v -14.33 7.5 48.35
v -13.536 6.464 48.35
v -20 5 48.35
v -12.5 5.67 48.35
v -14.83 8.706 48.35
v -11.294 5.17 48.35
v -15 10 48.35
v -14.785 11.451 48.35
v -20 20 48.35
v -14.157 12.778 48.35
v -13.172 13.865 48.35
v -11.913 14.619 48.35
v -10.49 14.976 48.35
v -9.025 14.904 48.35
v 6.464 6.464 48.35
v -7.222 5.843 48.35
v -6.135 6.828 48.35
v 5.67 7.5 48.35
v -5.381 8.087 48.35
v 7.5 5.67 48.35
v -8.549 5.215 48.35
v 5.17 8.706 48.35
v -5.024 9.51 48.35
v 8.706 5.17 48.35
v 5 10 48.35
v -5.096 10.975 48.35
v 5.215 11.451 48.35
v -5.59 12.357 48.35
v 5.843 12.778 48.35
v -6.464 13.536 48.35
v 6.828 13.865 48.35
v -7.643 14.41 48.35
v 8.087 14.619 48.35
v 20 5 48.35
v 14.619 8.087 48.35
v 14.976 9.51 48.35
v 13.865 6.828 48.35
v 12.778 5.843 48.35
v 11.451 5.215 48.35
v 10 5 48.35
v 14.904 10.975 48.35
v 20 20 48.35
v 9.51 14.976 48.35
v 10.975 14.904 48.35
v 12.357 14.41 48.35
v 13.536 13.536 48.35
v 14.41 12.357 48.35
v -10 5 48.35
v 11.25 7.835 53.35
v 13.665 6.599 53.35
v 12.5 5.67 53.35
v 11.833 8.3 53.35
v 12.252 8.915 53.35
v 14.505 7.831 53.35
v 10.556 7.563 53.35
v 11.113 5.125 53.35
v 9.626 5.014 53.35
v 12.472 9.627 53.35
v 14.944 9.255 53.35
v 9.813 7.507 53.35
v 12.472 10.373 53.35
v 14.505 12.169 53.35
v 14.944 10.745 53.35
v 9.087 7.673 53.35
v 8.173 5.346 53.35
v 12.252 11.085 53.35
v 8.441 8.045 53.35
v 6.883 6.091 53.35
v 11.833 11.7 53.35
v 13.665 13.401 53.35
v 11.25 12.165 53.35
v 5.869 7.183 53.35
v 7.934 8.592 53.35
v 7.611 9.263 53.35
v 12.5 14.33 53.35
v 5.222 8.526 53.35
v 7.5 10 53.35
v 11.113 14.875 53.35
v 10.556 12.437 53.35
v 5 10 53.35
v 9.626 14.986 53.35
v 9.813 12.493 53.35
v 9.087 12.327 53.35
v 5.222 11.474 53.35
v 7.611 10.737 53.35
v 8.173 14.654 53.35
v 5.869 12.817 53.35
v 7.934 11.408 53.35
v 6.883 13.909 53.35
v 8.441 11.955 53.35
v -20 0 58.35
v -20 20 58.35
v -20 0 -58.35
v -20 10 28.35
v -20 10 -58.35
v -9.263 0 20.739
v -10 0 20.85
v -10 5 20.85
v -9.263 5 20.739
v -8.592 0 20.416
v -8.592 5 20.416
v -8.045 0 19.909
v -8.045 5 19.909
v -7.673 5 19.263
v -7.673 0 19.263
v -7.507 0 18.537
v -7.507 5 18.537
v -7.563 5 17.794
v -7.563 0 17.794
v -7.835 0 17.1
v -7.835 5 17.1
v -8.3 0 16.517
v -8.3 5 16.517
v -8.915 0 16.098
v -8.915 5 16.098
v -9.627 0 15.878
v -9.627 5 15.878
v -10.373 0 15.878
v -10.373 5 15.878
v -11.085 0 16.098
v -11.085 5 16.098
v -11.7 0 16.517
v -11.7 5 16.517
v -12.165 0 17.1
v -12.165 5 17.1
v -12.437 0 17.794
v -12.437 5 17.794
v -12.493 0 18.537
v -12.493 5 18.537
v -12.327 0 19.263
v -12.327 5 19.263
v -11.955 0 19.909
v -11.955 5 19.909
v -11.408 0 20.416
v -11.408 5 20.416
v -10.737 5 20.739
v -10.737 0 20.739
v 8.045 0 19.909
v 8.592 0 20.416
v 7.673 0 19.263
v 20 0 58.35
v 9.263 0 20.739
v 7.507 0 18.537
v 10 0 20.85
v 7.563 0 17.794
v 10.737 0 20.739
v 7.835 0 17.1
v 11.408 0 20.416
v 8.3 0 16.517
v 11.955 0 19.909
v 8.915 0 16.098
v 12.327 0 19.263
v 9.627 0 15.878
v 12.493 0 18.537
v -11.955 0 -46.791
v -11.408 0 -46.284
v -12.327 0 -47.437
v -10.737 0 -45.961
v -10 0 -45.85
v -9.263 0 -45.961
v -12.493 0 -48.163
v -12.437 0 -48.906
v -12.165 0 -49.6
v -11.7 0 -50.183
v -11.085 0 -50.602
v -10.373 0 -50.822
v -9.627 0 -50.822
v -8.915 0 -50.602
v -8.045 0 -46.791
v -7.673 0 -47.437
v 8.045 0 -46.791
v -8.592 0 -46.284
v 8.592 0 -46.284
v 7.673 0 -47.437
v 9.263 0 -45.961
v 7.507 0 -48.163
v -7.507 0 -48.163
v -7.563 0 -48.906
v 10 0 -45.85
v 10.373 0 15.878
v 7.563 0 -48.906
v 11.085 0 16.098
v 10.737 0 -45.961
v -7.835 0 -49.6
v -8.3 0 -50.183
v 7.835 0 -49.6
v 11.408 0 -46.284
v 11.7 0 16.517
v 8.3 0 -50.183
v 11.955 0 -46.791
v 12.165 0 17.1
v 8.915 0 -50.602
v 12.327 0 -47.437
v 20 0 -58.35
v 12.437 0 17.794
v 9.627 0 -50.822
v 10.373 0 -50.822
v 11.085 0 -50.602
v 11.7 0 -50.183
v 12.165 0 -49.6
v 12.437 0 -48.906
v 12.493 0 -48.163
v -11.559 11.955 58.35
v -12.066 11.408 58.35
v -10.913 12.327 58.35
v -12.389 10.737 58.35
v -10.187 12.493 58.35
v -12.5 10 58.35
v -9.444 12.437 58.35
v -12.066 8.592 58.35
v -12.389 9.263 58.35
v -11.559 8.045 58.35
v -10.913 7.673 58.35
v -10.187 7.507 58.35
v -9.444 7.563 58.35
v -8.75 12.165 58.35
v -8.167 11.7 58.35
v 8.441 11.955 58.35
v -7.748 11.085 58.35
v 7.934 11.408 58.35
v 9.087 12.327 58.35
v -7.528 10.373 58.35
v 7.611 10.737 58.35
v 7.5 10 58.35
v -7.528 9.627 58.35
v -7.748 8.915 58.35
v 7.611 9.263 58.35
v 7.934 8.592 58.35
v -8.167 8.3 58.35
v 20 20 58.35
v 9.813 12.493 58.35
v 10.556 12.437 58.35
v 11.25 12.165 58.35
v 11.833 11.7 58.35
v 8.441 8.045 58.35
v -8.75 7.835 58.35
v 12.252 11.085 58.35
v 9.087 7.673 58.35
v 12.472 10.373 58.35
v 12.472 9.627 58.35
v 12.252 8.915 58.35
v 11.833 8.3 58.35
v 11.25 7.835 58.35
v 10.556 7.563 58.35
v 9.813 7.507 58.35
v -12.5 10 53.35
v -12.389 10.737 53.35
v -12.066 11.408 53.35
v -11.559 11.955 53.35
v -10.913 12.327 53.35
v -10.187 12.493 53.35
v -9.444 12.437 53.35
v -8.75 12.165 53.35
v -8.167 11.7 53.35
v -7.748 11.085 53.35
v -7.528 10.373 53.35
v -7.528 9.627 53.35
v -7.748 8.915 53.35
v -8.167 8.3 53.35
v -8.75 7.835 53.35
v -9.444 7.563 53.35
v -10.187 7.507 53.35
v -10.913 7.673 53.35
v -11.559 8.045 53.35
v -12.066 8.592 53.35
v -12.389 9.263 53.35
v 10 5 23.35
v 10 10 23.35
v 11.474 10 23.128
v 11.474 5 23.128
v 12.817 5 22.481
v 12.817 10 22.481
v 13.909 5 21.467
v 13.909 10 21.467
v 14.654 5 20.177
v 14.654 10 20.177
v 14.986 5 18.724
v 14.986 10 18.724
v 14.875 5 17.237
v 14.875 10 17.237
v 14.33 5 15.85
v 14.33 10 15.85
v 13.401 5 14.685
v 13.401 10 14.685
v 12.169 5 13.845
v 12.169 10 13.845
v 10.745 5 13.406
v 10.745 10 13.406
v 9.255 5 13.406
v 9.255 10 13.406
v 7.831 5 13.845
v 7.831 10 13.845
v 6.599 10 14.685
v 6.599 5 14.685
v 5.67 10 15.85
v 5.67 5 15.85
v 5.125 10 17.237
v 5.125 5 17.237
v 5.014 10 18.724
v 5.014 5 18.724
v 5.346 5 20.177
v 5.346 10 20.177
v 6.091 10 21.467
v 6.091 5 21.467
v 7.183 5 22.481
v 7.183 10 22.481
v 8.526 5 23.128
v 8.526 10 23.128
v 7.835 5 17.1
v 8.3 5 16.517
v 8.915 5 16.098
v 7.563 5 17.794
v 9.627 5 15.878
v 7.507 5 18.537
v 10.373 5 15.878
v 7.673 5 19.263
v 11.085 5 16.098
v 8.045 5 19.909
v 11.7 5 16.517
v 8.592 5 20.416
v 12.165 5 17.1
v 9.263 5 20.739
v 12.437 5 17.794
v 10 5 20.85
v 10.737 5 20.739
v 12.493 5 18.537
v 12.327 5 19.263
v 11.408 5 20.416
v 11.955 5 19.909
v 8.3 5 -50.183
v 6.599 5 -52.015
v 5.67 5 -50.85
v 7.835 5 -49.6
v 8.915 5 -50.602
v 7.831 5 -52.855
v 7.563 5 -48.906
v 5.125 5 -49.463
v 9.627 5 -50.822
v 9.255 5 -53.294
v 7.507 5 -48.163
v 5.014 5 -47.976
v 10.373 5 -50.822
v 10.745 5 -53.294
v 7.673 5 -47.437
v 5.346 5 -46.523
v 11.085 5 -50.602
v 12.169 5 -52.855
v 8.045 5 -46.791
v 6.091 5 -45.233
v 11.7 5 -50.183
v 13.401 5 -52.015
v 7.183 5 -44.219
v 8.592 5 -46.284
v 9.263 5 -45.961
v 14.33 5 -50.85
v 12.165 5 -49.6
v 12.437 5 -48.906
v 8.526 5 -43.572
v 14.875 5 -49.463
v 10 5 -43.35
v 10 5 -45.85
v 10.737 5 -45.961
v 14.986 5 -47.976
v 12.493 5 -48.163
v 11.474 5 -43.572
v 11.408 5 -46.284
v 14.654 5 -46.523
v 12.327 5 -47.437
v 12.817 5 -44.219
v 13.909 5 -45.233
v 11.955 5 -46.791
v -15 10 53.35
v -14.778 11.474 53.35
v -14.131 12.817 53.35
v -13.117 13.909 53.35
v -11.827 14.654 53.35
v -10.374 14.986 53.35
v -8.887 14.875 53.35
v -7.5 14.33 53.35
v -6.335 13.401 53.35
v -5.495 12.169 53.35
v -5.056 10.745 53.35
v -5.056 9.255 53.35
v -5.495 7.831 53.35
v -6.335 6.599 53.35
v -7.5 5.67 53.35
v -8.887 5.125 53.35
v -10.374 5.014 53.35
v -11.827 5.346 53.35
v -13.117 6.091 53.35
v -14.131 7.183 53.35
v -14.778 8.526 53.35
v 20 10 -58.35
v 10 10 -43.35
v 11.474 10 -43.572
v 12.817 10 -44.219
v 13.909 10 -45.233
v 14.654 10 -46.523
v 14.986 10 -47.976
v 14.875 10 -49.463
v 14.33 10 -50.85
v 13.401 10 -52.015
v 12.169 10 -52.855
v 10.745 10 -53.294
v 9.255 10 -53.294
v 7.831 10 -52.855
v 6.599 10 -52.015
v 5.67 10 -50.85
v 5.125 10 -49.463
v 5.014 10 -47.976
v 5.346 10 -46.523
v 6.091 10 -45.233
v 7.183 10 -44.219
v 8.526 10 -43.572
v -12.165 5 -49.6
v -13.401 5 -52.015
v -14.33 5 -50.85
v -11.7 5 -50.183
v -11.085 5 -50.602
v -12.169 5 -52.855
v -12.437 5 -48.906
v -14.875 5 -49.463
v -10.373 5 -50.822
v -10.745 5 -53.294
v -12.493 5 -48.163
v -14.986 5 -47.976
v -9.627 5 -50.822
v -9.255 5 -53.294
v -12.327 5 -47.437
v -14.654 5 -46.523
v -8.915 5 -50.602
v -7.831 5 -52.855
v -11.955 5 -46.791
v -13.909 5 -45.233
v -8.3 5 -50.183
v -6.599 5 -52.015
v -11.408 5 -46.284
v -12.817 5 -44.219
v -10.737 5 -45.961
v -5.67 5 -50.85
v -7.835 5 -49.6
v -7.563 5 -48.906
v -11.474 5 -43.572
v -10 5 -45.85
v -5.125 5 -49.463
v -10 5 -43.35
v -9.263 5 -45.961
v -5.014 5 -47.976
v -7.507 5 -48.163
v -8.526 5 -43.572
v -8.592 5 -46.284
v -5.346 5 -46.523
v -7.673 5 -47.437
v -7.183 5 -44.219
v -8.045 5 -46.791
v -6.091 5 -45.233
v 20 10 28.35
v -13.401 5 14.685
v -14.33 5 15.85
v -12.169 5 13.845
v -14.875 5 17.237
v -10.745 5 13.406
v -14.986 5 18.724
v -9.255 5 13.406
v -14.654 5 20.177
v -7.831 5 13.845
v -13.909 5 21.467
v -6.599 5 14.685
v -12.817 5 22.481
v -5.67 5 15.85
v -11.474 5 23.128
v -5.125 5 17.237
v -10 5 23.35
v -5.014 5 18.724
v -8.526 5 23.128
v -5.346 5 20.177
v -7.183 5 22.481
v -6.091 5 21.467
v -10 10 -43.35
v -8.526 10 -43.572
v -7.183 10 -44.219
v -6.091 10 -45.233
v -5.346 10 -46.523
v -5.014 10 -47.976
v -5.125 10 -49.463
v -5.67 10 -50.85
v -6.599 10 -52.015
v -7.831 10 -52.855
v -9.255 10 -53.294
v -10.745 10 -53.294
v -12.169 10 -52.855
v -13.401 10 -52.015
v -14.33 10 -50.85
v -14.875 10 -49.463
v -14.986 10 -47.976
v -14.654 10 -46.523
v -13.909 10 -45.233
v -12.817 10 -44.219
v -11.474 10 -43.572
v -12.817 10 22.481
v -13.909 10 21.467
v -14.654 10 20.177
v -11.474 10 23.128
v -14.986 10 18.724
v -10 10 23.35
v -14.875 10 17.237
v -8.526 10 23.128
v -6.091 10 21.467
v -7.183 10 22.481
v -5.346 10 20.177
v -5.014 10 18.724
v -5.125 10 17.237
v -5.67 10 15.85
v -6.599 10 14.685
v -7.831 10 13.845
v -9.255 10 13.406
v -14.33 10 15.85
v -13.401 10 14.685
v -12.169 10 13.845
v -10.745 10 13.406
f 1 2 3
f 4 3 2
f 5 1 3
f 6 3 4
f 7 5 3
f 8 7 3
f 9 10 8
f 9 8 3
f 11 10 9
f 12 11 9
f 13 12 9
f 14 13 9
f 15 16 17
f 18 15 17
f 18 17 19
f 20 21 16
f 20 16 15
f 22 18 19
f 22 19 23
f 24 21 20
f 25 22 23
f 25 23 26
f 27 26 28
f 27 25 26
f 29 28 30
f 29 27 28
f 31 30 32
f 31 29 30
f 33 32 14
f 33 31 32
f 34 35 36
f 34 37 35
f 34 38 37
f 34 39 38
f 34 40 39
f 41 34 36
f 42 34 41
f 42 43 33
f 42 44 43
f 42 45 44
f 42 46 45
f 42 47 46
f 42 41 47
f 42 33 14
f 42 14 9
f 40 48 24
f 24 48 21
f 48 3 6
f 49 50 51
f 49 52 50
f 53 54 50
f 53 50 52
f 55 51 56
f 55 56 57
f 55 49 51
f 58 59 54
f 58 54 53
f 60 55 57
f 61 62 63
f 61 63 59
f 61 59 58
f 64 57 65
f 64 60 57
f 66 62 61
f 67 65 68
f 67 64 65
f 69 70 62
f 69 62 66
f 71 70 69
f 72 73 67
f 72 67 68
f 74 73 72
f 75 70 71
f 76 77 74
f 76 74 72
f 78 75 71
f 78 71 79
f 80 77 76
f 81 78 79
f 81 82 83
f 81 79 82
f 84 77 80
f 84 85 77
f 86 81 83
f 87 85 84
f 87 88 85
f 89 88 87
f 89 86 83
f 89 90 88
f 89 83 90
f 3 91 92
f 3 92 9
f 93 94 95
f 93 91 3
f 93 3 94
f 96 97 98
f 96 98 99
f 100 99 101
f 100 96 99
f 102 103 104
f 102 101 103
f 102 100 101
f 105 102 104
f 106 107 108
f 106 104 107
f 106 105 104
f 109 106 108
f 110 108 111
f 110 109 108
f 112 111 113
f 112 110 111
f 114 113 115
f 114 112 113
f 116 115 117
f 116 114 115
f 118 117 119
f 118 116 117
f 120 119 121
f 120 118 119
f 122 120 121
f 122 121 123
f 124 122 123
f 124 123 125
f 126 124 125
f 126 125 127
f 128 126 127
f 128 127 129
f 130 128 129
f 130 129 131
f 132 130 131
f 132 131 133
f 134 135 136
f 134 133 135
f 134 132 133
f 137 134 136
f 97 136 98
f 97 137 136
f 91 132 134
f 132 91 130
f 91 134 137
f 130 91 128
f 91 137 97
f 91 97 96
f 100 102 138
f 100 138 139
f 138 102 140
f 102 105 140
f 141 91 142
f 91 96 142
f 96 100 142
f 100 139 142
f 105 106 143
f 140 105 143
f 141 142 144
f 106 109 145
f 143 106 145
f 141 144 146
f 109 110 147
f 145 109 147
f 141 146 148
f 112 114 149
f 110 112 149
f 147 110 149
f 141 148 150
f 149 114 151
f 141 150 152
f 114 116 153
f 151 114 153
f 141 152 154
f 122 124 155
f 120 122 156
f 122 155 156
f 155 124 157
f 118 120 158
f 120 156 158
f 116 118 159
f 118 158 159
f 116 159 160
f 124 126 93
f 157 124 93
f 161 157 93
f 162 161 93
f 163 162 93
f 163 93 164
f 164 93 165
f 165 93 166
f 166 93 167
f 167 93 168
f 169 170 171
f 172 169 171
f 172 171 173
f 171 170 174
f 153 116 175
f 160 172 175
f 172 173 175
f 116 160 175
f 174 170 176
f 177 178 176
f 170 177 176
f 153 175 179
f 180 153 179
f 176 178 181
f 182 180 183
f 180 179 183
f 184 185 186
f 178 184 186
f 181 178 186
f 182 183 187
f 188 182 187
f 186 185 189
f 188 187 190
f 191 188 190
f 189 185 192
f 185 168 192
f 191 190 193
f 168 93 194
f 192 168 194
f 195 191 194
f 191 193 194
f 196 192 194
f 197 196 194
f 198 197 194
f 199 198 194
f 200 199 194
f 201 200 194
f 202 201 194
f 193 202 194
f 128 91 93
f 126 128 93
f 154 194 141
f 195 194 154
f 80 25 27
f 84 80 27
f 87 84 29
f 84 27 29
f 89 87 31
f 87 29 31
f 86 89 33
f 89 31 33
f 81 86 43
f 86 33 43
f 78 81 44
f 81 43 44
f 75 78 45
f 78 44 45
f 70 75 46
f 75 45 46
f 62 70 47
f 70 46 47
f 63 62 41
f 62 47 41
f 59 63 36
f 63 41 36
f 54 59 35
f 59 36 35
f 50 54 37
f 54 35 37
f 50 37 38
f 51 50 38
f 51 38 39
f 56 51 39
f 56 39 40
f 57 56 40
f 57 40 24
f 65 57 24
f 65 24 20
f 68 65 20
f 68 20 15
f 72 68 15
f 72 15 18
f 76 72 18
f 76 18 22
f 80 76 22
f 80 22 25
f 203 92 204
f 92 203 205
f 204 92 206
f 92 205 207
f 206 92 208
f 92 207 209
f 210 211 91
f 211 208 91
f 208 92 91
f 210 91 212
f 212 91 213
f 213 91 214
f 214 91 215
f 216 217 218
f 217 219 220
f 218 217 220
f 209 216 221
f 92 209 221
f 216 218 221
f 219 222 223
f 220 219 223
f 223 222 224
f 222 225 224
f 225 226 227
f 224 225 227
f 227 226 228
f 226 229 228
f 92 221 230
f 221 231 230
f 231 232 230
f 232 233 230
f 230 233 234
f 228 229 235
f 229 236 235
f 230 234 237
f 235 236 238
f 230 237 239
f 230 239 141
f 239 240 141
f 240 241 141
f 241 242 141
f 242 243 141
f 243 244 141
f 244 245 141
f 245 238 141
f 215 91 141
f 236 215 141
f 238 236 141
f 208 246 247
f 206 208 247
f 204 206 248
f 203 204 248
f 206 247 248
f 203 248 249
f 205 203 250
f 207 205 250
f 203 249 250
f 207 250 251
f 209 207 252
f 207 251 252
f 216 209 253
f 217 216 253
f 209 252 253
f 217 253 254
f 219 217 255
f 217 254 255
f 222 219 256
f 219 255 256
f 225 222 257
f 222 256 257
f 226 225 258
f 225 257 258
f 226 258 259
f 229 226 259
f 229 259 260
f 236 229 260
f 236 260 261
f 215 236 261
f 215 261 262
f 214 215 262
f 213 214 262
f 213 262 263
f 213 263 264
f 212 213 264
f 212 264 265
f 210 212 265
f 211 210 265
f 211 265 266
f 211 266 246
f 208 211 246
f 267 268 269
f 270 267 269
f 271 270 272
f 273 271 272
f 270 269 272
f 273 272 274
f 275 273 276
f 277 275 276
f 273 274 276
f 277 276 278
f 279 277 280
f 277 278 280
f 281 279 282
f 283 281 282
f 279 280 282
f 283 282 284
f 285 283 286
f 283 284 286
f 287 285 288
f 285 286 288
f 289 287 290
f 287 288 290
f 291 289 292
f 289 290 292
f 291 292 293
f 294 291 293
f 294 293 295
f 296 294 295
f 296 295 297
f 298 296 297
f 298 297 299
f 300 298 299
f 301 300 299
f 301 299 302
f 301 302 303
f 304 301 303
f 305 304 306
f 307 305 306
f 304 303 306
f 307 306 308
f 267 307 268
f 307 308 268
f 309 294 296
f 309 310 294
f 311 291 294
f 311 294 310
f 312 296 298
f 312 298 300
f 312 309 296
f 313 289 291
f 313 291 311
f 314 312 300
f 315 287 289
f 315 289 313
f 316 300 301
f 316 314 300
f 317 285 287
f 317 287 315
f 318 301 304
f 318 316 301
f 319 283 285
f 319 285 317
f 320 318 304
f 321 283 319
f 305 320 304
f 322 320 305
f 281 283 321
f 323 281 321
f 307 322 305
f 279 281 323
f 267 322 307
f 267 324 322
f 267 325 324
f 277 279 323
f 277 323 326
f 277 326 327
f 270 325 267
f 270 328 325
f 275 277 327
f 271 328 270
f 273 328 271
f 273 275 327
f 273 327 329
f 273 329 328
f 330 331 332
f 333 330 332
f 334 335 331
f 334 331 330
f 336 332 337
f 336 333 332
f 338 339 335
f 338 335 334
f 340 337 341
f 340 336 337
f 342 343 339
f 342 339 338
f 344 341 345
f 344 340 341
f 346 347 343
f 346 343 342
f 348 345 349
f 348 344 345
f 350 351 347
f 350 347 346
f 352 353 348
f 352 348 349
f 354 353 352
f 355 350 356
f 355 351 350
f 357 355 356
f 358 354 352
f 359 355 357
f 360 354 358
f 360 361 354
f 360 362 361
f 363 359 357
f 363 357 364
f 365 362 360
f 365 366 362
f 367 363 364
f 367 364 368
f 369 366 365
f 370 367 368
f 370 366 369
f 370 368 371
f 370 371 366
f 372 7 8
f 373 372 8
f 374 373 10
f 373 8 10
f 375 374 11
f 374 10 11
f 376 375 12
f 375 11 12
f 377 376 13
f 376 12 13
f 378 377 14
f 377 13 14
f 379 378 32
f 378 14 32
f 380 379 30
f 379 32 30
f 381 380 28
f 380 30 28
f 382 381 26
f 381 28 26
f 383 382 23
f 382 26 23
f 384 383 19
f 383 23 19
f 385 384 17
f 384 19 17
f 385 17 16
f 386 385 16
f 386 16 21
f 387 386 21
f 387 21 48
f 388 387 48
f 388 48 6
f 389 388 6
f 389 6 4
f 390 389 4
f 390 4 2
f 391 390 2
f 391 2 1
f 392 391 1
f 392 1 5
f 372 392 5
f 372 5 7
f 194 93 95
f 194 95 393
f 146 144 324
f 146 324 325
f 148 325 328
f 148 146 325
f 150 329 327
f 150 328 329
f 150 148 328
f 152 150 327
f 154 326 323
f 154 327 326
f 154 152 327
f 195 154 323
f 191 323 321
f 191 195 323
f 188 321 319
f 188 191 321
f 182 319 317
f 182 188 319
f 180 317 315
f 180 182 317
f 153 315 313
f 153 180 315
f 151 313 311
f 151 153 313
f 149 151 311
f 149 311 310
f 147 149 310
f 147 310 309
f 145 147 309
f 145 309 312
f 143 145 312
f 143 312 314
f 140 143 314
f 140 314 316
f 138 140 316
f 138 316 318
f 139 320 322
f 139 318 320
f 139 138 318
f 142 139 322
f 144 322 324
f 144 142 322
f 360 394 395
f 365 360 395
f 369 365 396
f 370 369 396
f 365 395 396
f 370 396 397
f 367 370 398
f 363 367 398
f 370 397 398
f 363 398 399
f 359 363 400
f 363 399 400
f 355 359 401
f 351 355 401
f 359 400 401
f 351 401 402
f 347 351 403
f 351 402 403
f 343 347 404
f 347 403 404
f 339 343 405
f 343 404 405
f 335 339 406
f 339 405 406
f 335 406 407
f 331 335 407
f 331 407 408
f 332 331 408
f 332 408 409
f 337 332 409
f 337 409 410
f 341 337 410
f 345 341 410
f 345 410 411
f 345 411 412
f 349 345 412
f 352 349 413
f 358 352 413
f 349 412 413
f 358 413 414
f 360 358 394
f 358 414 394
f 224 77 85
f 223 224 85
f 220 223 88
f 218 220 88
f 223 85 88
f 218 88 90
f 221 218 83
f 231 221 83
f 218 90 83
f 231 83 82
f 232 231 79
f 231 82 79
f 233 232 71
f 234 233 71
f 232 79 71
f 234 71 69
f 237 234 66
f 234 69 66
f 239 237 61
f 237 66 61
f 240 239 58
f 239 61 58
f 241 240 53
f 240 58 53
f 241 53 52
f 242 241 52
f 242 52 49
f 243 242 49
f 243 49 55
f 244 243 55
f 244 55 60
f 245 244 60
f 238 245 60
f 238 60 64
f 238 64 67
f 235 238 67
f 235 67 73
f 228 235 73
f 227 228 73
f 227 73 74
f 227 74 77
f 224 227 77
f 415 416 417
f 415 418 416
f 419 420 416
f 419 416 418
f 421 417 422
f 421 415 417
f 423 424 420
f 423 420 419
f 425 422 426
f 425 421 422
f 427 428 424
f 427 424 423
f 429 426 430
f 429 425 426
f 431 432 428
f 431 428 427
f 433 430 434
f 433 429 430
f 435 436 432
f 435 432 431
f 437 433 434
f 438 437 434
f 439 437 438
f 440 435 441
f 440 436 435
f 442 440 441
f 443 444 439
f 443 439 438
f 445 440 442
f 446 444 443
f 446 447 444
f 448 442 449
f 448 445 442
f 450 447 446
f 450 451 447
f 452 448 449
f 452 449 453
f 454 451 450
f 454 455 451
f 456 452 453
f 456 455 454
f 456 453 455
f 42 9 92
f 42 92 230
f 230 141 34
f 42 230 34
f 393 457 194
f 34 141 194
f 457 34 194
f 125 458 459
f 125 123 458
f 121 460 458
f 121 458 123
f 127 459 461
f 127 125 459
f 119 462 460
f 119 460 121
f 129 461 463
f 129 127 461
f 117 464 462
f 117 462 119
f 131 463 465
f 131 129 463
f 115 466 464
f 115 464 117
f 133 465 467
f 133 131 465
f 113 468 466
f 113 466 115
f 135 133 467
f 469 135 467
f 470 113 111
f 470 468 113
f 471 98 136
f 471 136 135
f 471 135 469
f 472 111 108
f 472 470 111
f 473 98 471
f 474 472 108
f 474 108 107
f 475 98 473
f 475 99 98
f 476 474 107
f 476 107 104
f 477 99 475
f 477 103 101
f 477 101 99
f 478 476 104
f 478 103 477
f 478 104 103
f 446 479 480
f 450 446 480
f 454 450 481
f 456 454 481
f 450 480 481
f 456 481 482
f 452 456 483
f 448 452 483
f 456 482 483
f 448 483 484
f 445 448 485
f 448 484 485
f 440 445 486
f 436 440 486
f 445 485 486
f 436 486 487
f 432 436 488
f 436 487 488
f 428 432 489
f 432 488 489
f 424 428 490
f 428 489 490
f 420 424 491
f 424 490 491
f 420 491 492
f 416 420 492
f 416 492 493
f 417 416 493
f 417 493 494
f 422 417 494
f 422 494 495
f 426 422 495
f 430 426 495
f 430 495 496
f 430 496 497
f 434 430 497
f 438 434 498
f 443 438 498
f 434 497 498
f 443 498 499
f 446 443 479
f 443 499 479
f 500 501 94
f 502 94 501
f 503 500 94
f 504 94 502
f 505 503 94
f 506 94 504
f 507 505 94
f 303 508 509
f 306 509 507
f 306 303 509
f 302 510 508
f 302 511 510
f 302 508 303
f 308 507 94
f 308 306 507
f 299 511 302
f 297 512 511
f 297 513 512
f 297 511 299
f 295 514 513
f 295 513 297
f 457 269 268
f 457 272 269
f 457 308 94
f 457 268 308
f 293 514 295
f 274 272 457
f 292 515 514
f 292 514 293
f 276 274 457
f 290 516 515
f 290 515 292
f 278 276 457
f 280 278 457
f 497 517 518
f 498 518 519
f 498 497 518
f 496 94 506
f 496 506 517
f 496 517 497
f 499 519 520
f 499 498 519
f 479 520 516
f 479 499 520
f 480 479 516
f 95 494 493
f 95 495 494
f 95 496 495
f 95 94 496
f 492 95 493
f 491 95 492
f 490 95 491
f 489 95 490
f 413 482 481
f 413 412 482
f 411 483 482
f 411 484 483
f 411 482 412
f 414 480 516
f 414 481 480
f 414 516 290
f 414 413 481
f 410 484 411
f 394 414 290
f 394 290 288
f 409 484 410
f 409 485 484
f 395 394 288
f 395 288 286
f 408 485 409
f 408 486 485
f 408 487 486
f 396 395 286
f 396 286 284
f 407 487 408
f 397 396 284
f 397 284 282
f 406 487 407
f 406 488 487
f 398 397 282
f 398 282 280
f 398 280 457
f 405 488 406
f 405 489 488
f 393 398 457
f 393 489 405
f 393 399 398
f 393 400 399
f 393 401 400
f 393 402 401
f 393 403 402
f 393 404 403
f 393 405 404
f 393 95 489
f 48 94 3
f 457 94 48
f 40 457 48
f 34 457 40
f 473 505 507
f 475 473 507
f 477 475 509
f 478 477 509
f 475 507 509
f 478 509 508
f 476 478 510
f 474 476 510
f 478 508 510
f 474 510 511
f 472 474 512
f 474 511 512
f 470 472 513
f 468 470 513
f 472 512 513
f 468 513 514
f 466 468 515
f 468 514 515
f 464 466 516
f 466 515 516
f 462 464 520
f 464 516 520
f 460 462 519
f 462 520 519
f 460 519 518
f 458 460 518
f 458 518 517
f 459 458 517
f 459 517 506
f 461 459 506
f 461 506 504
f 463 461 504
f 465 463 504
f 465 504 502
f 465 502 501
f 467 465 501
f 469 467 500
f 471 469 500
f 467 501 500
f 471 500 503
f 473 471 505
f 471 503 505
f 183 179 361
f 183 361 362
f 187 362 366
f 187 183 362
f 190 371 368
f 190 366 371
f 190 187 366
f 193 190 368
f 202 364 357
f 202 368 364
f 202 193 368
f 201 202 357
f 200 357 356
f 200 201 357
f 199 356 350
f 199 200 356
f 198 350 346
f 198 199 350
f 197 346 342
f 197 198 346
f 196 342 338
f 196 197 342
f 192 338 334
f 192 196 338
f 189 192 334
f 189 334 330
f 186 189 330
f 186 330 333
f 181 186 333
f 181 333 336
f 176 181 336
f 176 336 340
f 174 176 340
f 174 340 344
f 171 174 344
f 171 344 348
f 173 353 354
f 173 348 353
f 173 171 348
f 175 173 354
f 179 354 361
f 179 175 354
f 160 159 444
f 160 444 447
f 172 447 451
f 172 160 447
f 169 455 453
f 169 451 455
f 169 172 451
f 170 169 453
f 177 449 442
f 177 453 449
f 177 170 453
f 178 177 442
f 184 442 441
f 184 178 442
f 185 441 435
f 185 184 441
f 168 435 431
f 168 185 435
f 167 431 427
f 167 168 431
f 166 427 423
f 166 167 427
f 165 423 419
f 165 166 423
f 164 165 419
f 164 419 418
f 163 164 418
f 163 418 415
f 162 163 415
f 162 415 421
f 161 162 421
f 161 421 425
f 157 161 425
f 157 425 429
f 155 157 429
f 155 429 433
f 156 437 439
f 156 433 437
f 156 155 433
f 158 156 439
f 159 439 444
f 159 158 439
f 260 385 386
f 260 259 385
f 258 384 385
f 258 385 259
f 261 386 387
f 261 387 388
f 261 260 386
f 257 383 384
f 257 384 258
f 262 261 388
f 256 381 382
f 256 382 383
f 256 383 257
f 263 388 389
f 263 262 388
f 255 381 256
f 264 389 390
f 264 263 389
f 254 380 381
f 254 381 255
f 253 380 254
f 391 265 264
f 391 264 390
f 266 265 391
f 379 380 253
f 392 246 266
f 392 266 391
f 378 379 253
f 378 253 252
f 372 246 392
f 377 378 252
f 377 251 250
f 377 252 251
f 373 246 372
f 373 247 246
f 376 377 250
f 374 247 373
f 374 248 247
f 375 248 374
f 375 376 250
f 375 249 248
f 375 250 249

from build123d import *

# Parameters (mm, degrees)
SKETCH1_W               = 40
SKETCH1_H               = 116.7
BOSS_EXTRUDE1_DEPTH     = 10
SKETCH2_W               = 40
SKETCH2_H               = 10
BOSS_EXTRUDE2_DEPTH     = 10
CUT_EXTRUDE1_DEPTH      = 63.487778805
CUT_EXTRUDE1_DEPTH_BACK = 63.487778805
SKETCH3_R               = 2.5
SKETCH4_R               = 5
CUT_EXTRUDE2_DEPTH      = 5
CUT_EXTRUDE3_DEPTH      = 74.516817804
CUT_EXTRUDE3_DEPTH_BACK = 74.516817804
SKETCH6_R               = 2.5
CUT_EXTRUDE4_DEPTH      = 111.385189224
SKETCH7_R               = 5
CUT_EXTRUDE5_DEPTH      = 5


with BuildPart() as part:
    # Sketch1 → Boss-Extrude1 (new body)
    with BuildSketch(Plane(origin=(0, 0, 0), x_dir=(1, 0, 0), z_dir=(0, 1, 0))):
        Rectangle(SKETCH1_W, SKETCH1_H)
    extrude(amount=BOSS_EXTRUDE1_DEPTH)

    # Sketch2 → Boss-Extrude2 (add)
    with BuildSketch(Plane(origin=(0, 10, 0), x_dir=(1, 0, 0), z_dir=(0, 1, 0))):
        with Locations((0, -53.35)):
            Rectangle(SKETCH2_W, SKETCH2_H)
    extrude(amount=BOSS_EXTRUDE2_DEPTH)

    # Sketch3 → Cut-Extrude1 (cut, two sides: drawn at the far end of the back side and taken through both)
    with BuildSketch(Plane(origin=(0, 10, 0), x_dir=(1, 0, 0), z_dir=(0, 1, 0)).offset(-CUT_EXTRUDE1_DEPTH_BACK)):
        with Locations(Location((-10, 48.35, 0), (0, 0, 270))):
            Circle(SKETCH3_R)
        with Locations(Location((10, 48.35, 0), (0, 0, 270))):
            Circle(SKETCH3_R)
        with Locations(Location((10, -18.35, 0), (0, 0, 270))):
            Circle(SKETCH3_R)
        with Locations(Location((-10, -18.35, 0), (0, 0, 270))):
            Circle(SKETCH3_R)
    extrude(amount=CUT_EXTRUDE1_DEPTH + CUT_EXTRUDE1_DEPTH_BACK, mode=Mode.SUBTRACT)

    # Sketch4 → Cut-Extrude2 (cut)
    with BuildSketch(Plane(origin=(0, 10, 0), x_dir=(1, 0, 0), z_dir=(0, 1, 0))):
        with Locations(Location((10, 48.35, 0), (0, 0, 270))):
            Circle(SKETCH4_R)
        with Locations(Location((-10, 48.35, 0), (0, 0, 270))):
            Circle(SKETCH4_R)
        with Locations(Location((10, -18.35, 0), (0, 0, 270))):
            Circle(SKETCH4_R)
        with Locations(Location((-10, -18.35, 0), (0, 0, 270))):
            Circle(SKETCH4_R)
    extrude(amount=-CUT_EXTRUDE2_DEPTH, mode=Mode.SUBTRACT)

    # Sketch5 → Cut-Extrude3 (cut, two sides: drawn at the far end of the back side and taken through both)
    with BuildSketch(Plane.ZY.offset(20).offset(-CUT_EXTRUDE3_DEPTH_BACK)):
        Polygon((28.35, 10), (48.35, 5), (48.35, 10), align=None)
    extrude(amount=CUT_EXTRUDE3_DEPTH + CUT_EXTRUDE3_DEPTH_BACK, mode=Mode.SUBTRACT)

    # Sketch6 → Cut-Extrude4 (cut, through all)
    with BuildSketch(Plane(origin=(0, 0, 48.35), x_dir=(-1, 0, 0), z_dir=(0, 0, -1))):
        with Locations((-10, 10)):
            Circle(SKETCH6_R)
        with Locations((10, 10)):
            Circle(SKETCH6_R)
    extrude(amount=-CUT_EXTRUDE4_DEPTH, mode=Mode.SUBTRACT)

    # Sketch7 → Cut-Extrude5 (cut)
    with BuildSketch(Plane(origin=(0, 0, 48.35), x_dir=(-1, 0, 0), z_dir=(0, 0, -1))):
        with Locations((-10, 10)):
            Circle(SKETCH7_R)
        with Locations((10, 10)):
            Circle(SKETCH7_R)
    extrude(amount=-CUT_EXTRUDE5_DEPTH, mode=Mode.SUBTRACT)


solid = part.part
